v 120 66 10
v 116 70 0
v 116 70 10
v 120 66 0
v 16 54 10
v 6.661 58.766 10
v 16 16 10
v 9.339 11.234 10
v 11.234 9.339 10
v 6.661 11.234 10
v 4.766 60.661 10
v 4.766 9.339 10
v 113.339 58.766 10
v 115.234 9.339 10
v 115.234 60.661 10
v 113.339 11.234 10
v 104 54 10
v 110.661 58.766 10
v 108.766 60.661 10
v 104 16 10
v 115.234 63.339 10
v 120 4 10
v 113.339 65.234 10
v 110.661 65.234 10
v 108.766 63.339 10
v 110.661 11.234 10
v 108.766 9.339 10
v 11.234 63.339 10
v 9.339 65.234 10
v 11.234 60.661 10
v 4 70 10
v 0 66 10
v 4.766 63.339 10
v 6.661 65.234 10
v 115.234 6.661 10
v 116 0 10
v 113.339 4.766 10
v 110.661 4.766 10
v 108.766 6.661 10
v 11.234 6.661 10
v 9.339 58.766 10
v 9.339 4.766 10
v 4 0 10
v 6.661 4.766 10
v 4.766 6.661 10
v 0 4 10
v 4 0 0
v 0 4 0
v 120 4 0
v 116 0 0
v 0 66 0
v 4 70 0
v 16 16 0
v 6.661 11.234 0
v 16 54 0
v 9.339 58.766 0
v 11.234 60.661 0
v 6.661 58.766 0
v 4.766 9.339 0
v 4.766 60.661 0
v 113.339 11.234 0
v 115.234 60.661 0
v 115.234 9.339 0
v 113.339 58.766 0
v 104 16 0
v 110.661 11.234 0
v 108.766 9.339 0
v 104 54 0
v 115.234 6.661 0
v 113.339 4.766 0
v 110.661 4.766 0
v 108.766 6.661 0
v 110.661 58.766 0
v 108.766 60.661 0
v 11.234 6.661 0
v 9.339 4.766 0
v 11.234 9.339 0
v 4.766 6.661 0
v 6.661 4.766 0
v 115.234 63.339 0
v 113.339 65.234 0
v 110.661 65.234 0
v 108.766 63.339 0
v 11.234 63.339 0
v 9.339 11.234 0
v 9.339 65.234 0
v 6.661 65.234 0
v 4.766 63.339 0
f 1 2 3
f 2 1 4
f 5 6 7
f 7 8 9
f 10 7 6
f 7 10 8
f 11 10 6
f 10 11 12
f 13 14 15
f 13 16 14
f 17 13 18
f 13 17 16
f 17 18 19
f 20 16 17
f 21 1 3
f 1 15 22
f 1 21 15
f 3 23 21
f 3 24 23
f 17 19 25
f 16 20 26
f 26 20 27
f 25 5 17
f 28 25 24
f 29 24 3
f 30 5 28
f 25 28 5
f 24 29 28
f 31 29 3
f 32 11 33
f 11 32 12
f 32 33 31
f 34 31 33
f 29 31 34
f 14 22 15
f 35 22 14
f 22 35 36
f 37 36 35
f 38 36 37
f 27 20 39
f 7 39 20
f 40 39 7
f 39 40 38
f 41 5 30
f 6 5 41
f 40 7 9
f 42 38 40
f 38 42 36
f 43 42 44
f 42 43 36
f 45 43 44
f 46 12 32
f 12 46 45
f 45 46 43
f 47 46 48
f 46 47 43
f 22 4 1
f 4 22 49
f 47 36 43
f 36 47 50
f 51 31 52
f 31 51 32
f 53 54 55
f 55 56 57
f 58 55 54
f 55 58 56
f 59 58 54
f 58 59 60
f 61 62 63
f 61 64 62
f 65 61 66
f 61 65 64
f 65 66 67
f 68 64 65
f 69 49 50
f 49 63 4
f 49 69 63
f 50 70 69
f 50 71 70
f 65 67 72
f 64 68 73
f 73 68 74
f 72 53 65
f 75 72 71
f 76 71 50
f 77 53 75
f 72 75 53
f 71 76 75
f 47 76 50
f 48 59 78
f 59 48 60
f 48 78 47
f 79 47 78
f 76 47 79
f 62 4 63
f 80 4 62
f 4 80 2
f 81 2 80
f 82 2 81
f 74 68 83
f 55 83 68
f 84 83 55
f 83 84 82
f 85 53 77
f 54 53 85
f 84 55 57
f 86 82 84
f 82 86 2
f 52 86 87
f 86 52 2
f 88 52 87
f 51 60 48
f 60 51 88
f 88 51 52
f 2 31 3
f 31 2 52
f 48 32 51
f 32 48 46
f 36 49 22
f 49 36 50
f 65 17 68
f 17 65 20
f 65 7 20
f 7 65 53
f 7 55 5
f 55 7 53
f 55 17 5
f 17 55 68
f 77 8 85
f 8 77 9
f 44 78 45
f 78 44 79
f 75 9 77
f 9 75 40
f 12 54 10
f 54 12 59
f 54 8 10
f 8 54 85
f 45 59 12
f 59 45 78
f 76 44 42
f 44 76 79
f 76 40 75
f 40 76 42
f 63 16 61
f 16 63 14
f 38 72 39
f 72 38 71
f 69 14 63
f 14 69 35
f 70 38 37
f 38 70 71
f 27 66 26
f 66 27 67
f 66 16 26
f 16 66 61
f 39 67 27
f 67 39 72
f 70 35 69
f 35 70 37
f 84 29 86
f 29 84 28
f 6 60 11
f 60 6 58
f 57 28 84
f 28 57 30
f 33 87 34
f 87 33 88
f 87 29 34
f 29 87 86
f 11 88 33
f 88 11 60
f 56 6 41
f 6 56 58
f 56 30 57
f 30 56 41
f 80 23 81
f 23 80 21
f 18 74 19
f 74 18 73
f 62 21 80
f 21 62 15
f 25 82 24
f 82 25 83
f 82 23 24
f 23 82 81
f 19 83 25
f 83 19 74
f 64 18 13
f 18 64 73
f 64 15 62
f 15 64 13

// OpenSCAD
$fn = 32;

// ----------------------------------------------------------------------
// Frame plate: 120 x 70 frame, 16 mm rails
// ----------------------------------------------------------------------

// --- parameters (mm) ---
plate_l = 120;            // plate length, X
plate_w = 70;             // plate width, Y
plate_t = 10;             // plate thickness, Z (extrusion height)
corner_c = 4;             // corner chamfer
frame_bar = 16;           // frame rail width
bolt_r = 3.5;             // corner bolt window radius
bolt_inset = 8;           // bolt centre inset from the edges

win_l = plate_l - 2 * frame_bar;  // window length
win_w = plate_w - 2 * frame_bar;  // window width
bolt_d = 2 * bolt_r;  // corner hole diameter

profile = [[4, 0], [116, 0], [120, 4], [120, 66], [116, 70], [4, 70], [0, 66], [0, 4]];  // primary outline, 8 points, counter clockwise
void_1 = [[16, 16], [104, 16], [104, 54], [16, 54]];  // the window, 4 points
void_2 = [[11.234, 9.339], [9.339, 11.234], [6.661, 11.234], [4.766, 9.339], [4.766, 6.661], [6.661, 4.766], [9.339, 4.766], [11.234, 6.661]];  // corner bolt window, 8 points
void_3 = [[115.234, 9.339], [113.339, 11.234], [110.661, 11.234], [108.766, 9.339], [108.766, 6.661], [110.661, 4.766], [113.339, 4.766], [115.234, 6.661]];  // corner bolt window, 8 points
void_4 = [[11.234, 63.339], [9.339, 65.234], [6.661, 65.234], [4.766, 63.339], [4.766, 60.661], [6.661, 58.766], [9.339, 58.766], [11.234, 60.661]];  // corner bolt window, 8 points
void_5 = [[115.234, 63.339], [113.339, 65.234], [110.661, 65.234], [108.766, 63.339], [108.766, 60.661], [110.661, 58.766], [113.339, 58.766], [115.234, 60.661]];  // corner bolt window, 8 points

// --- the one profile operation ---
difference() {
  linear_extrude(height = plate_t) polygon(points = profile);
  translate([0, 0, -1])
    linear_extrude(height = plate_t + 2) polygon(points = void_1);
  translate([0, 0, -1])
    linear_extrude(height = plate_t + 2) polygon(points = void_2);
  translate([0, 0, -1])
    linear_extrude(height = plate_t + 2) polygon(points = void_3);
  translate([0, 0, -1])
    linear_extrude(height = plate_t + 2) polygon(points = void_4);
  translate([0, 0, -1])
    linear_extrude(height = plate_t + 2) polygon(points = void_5);
}
